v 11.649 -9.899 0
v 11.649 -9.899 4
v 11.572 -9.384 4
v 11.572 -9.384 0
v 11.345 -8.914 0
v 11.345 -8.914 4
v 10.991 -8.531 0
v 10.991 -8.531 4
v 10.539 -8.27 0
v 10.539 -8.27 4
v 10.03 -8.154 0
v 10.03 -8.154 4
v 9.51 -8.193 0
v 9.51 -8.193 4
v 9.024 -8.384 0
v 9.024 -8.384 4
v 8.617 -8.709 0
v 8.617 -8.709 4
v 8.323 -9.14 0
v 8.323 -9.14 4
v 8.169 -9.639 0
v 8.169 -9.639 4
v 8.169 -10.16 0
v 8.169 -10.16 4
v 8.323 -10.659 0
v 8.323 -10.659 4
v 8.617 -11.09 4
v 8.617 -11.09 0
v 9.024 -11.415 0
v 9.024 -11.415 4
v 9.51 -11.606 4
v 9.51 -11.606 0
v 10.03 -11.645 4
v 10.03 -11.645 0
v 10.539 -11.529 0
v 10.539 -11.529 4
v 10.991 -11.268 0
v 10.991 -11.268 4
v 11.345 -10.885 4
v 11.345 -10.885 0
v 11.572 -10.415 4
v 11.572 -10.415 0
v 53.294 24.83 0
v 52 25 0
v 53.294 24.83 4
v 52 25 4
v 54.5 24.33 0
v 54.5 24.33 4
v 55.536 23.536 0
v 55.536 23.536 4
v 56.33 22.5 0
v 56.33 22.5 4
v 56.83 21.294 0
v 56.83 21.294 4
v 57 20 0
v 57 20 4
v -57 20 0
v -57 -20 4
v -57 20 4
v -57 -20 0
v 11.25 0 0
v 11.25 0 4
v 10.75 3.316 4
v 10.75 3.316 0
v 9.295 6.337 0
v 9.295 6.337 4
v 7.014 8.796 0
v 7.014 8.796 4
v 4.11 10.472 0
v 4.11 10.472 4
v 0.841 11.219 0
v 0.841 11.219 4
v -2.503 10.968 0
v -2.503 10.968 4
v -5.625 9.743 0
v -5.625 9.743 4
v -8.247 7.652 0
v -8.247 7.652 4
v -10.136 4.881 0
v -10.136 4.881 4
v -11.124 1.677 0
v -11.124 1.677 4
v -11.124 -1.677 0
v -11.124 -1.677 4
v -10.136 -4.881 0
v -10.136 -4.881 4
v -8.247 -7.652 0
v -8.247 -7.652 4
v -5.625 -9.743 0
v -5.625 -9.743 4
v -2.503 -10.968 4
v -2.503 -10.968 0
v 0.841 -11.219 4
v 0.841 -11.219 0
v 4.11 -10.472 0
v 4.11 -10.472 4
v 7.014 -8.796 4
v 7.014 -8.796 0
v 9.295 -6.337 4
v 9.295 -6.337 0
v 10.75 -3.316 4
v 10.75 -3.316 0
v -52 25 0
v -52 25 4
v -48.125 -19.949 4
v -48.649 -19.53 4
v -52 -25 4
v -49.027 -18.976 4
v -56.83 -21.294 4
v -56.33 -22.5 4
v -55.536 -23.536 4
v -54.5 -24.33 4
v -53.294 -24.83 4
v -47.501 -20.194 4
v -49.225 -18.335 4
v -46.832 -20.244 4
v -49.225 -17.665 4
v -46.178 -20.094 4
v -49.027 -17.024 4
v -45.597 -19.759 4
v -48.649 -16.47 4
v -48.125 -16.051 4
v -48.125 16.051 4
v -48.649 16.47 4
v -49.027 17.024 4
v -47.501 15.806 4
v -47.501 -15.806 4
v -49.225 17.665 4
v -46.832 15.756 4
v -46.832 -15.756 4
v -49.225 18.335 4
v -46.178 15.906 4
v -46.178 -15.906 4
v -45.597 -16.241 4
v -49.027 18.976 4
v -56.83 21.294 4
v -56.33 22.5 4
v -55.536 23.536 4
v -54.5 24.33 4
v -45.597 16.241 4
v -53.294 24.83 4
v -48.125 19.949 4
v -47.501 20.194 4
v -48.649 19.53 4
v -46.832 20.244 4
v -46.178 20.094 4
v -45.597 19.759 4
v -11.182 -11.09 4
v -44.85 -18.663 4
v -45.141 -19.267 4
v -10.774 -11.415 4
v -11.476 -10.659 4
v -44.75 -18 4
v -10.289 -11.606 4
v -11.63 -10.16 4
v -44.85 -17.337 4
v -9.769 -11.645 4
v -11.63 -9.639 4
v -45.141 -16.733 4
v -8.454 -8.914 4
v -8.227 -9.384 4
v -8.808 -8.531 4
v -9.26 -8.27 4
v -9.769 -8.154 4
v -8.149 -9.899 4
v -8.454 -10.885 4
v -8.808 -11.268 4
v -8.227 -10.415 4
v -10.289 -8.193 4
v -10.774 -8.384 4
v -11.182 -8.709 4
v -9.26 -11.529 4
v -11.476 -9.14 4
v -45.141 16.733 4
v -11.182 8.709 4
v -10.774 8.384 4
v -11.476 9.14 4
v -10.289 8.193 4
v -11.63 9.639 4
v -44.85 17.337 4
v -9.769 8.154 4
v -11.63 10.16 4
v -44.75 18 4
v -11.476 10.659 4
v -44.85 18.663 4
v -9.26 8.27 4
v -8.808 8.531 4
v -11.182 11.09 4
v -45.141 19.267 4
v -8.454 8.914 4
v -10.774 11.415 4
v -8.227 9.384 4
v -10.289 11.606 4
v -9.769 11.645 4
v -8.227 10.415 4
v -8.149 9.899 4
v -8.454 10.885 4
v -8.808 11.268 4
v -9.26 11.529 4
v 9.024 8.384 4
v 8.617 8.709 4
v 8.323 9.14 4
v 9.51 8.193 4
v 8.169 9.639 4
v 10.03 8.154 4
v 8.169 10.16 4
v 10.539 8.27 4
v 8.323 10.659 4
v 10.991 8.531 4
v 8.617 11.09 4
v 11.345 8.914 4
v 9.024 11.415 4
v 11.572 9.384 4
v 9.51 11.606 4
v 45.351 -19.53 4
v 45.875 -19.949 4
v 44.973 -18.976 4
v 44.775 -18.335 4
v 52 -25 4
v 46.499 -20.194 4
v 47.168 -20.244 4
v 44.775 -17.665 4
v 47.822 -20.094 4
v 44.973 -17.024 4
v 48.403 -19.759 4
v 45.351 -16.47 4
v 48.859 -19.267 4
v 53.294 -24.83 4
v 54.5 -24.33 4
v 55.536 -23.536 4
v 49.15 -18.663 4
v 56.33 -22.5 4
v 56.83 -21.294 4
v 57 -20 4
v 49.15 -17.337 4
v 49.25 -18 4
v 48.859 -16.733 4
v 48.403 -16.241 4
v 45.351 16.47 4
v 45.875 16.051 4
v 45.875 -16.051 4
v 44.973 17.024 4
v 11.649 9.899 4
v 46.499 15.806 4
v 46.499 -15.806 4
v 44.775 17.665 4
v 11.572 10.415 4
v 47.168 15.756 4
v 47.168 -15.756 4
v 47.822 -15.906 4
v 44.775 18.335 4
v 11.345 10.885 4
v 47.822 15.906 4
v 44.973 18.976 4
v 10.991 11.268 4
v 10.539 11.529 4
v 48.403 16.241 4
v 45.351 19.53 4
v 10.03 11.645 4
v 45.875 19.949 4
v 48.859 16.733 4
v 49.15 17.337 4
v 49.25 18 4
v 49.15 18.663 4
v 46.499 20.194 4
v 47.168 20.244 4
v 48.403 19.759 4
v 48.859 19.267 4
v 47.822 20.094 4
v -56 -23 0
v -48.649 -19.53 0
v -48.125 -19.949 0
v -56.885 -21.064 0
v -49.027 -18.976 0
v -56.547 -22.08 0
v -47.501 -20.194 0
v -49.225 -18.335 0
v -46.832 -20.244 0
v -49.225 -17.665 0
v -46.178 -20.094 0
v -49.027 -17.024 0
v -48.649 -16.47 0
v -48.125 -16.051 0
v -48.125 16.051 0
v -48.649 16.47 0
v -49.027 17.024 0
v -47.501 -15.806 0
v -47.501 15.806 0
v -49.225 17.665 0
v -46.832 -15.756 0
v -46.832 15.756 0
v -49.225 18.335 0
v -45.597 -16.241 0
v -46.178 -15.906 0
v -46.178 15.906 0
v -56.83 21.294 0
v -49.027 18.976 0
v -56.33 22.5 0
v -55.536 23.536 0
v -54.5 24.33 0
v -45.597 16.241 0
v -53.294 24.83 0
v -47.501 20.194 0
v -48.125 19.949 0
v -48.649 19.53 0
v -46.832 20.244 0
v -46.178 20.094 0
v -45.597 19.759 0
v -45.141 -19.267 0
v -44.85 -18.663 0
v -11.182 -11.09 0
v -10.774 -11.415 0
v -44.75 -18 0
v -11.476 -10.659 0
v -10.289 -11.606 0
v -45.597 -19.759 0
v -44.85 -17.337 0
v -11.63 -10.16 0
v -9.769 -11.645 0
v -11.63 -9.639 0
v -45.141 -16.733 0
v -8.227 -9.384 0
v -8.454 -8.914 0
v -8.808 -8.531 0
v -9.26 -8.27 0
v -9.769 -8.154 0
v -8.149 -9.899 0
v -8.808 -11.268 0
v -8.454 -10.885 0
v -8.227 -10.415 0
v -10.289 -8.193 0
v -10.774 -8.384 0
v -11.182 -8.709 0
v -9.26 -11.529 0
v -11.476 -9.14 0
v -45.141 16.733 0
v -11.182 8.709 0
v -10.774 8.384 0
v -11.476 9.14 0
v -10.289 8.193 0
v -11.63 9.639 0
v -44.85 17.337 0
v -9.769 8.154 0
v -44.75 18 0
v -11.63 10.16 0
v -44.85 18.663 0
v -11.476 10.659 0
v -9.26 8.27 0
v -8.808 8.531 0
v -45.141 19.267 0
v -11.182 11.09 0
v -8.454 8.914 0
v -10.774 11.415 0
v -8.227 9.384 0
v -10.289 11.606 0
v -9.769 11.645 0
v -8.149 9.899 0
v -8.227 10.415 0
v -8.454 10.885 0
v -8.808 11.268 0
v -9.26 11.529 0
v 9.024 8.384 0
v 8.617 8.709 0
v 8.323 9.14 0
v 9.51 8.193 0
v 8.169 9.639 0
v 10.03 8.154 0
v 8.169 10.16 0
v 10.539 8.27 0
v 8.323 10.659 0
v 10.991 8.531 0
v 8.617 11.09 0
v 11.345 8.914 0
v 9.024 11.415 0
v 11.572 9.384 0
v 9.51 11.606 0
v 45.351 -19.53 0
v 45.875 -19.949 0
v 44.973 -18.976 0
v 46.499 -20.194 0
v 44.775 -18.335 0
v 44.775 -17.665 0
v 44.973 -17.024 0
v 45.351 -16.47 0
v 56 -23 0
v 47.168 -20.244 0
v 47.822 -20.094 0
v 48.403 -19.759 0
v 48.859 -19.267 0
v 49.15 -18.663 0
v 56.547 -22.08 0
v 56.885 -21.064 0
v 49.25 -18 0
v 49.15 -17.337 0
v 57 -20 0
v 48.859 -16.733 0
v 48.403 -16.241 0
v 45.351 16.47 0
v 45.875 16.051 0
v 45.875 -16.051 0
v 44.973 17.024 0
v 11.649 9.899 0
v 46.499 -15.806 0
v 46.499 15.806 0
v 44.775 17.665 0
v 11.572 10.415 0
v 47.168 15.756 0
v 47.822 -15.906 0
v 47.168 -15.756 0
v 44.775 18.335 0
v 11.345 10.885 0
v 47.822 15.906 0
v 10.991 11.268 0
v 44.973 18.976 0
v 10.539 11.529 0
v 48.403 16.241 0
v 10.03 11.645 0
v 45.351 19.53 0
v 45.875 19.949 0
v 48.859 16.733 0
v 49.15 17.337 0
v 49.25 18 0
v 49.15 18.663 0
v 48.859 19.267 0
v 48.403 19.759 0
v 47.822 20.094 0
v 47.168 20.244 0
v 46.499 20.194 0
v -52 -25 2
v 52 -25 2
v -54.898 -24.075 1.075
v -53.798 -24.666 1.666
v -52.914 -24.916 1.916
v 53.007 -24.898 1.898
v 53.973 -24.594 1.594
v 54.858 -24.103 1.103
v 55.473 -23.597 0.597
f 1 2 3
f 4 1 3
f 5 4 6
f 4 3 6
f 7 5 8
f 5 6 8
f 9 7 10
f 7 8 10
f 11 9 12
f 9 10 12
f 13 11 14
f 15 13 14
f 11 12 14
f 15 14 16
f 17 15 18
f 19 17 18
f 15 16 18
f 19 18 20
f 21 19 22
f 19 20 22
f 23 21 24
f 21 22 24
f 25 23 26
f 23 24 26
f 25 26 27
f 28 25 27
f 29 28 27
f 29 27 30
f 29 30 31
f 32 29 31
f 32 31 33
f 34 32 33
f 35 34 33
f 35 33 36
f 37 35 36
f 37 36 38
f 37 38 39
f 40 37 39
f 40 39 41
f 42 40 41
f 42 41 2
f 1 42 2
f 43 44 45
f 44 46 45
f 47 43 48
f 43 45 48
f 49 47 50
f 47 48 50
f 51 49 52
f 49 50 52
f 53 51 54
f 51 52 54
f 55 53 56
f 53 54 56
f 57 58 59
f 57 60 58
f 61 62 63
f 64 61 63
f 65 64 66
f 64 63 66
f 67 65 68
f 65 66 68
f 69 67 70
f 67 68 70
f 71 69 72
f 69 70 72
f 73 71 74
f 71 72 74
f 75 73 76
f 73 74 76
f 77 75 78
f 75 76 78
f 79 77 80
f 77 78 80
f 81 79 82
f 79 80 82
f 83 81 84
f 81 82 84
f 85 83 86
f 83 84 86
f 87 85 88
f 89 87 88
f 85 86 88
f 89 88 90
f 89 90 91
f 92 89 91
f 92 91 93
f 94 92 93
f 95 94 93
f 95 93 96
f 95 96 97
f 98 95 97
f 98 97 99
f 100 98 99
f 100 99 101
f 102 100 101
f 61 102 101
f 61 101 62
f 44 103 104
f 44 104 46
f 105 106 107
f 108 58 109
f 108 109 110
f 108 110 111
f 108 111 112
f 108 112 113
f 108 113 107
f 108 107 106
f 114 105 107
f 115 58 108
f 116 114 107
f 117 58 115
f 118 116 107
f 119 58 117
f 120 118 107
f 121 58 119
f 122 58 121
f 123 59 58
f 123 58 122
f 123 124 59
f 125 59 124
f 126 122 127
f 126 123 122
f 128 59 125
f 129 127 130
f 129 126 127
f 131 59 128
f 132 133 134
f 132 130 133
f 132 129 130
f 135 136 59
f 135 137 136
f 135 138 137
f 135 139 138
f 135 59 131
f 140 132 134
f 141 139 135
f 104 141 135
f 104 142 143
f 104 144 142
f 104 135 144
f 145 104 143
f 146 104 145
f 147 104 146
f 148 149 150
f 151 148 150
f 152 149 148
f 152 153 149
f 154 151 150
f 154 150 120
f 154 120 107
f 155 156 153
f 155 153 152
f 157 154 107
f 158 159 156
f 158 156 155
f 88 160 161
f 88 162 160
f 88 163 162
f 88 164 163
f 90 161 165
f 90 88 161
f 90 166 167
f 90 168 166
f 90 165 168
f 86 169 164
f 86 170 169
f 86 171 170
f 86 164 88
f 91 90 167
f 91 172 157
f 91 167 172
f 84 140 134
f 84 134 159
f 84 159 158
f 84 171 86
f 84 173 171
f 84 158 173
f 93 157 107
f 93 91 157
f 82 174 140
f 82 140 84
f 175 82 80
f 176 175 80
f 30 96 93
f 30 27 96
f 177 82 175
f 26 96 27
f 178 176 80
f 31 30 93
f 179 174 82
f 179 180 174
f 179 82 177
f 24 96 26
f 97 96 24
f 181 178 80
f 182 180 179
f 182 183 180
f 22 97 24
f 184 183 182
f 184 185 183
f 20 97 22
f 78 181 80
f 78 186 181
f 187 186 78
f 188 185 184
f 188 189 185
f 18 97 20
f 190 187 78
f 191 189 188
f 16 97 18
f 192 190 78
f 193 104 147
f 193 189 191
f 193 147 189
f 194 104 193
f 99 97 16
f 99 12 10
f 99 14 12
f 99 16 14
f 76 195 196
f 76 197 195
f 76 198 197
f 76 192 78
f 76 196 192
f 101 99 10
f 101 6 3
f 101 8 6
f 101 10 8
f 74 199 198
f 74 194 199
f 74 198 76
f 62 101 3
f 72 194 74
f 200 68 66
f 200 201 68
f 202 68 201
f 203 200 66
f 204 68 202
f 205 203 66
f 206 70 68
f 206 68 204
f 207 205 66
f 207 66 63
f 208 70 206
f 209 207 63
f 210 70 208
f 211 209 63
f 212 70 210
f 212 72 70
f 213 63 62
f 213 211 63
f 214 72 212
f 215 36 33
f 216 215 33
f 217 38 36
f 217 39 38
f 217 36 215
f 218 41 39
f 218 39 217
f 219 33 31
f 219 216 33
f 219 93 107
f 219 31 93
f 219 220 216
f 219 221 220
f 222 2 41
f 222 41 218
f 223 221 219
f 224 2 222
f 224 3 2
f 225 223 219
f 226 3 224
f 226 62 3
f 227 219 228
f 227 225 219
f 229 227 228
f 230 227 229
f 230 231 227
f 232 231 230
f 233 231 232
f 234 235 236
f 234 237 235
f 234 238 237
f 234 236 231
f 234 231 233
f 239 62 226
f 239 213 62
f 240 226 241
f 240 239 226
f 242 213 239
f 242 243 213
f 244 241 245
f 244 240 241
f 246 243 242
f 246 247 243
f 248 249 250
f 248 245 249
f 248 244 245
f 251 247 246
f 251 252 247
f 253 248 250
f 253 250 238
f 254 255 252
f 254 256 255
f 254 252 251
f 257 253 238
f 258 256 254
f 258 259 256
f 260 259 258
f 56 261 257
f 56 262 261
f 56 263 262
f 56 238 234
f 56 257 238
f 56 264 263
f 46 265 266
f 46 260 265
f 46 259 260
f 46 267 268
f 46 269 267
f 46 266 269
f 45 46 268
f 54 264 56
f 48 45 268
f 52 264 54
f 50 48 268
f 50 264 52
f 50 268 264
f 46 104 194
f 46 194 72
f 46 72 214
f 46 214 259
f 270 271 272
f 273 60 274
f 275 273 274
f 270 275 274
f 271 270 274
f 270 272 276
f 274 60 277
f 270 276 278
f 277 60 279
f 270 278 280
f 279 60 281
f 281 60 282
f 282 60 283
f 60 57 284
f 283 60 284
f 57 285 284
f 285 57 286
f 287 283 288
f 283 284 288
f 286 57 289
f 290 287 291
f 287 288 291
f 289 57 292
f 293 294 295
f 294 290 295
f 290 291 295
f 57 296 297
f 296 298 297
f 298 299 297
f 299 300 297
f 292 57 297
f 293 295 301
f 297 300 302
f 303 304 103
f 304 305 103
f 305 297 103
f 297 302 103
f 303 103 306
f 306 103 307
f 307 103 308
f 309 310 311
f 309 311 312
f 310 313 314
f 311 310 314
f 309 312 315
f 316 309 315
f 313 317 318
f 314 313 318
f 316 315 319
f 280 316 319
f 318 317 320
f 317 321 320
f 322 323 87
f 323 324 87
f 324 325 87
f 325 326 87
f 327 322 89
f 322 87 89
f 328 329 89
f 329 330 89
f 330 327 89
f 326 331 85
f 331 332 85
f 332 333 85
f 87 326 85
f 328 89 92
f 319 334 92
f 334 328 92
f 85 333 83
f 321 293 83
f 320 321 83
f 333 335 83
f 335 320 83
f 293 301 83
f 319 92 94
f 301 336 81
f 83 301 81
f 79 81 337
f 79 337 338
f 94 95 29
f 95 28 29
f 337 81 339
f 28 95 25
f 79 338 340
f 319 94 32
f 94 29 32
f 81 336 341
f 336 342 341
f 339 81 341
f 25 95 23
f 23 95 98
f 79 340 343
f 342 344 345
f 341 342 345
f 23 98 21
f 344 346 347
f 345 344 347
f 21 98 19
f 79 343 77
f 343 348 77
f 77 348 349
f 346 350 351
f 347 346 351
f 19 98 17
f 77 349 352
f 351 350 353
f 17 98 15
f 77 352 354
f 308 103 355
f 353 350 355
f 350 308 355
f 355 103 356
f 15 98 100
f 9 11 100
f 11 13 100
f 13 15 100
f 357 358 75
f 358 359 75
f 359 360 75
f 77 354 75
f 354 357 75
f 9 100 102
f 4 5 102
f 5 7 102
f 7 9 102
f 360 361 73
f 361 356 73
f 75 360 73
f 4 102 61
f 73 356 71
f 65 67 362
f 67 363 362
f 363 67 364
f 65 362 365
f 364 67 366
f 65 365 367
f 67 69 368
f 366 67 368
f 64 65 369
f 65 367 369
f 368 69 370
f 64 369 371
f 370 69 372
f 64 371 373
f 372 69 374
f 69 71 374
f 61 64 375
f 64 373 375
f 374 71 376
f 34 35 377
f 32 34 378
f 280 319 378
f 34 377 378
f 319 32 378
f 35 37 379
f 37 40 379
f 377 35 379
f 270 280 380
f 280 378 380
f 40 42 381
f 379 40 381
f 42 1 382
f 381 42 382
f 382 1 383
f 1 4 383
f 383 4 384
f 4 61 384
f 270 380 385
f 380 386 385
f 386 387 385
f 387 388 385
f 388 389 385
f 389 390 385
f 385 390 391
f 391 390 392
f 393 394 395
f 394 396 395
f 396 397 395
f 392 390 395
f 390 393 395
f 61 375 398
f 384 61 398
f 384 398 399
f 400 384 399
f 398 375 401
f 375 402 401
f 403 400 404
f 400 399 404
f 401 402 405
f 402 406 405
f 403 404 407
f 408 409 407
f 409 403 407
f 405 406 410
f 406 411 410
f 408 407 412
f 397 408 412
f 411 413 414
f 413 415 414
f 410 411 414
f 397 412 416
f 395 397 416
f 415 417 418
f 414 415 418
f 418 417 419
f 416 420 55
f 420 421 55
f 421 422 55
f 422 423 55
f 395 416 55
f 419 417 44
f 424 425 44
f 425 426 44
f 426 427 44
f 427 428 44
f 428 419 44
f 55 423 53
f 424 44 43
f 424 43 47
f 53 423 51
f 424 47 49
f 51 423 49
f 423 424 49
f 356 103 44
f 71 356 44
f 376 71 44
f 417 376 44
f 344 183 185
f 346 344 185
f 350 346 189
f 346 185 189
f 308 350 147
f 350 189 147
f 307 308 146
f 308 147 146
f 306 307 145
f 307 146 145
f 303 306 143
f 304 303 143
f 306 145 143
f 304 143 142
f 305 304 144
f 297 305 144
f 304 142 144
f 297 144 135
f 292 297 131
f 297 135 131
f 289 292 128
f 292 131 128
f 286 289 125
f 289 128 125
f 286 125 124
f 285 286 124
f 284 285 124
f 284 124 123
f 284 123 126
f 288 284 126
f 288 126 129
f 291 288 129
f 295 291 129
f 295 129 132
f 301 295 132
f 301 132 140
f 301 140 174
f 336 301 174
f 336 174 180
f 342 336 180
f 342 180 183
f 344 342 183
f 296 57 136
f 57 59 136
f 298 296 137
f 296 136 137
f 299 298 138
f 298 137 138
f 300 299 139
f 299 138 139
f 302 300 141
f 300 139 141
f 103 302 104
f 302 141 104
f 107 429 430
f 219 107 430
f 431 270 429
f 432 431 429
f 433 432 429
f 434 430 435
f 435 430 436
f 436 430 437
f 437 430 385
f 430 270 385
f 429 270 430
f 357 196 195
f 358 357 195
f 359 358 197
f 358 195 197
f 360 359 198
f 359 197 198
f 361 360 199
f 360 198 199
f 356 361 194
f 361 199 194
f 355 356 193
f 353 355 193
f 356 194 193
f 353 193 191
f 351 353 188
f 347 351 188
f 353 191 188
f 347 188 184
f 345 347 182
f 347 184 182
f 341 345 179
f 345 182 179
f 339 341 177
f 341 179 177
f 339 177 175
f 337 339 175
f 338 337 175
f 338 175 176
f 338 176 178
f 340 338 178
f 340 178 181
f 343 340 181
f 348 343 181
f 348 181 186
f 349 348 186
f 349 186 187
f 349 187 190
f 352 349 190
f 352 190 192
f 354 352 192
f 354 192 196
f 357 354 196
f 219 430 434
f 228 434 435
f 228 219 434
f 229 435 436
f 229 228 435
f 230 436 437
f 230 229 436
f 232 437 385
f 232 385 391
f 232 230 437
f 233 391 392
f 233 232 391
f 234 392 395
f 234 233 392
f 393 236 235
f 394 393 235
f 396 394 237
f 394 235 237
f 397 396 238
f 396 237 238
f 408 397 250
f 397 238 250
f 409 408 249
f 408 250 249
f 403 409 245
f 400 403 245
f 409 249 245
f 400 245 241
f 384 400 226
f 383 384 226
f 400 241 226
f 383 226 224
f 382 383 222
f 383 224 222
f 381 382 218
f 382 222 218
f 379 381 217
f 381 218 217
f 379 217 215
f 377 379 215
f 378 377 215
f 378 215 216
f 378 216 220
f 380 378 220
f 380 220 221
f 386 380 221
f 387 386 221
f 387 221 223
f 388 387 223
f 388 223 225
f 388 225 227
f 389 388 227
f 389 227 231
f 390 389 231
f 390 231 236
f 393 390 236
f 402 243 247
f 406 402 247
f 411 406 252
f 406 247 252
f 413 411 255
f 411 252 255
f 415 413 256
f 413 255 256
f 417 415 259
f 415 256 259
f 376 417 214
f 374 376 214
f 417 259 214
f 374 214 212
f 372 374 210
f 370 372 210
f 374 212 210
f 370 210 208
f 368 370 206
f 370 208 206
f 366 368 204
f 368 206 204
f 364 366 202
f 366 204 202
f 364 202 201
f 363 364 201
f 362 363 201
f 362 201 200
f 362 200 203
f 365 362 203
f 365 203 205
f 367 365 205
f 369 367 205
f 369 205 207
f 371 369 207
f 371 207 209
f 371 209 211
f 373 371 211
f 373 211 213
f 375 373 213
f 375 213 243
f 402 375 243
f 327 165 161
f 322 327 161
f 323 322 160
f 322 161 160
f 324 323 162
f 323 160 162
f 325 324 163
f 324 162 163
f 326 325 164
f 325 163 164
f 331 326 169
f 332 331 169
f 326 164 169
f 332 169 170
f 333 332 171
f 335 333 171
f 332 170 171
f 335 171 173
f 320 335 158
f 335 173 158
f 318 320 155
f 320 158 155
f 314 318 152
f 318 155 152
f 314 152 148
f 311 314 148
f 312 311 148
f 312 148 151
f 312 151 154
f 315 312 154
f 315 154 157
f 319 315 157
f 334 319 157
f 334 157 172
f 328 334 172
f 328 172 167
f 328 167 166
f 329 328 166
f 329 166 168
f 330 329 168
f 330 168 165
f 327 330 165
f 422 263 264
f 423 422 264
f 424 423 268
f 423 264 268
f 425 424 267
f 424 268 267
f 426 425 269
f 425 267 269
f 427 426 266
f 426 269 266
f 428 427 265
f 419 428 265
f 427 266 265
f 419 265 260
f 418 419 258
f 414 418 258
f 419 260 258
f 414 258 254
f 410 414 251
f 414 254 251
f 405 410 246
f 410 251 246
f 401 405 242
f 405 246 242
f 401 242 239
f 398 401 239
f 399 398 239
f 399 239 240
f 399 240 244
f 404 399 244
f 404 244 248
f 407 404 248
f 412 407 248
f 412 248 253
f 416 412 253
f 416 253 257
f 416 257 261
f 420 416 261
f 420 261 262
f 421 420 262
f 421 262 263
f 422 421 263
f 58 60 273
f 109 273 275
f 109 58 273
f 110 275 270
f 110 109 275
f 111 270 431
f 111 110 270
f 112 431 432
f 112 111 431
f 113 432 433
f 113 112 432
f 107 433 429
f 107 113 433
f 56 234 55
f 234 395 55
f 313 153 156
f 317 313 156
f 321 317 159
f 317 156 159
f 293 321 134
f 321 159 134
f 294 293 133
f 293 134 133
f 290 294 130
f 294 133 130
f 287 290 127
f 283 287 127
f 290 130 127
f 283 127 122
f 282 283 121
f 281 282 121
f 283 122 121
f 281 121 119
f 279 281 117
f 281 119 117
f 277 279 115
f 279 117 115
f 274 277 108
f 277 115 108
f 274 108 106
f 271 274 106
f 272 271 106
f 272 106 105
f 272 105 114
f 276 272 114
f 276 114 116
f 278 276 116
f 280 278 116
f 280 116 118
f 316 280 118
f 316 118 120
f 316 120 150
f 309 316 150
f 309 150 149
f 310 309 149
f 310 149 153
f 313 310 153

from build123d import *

# Parameters (mm, degrees)
SKETCH_W      = 114
SKETCH_H      = 50
PAD_DEPTH     = 4
SKETCH001_R   = 11.25
SKETCH001_R_2 = 2.25
SKETCH001_R_3 = 1.75
POCKET_DEPTH  = 4.001
CHAMFER_SIZE  = 2
FILLET_R      = 5


with BuildPart() as part:
    # Sketch → Pad (new body)
    with BuildSketch(Plane.XY):
        Rectangle(SKETCH_W, SKETCH_H)
    extrude(amount=PAD_DEPTH)

    # Sketch001 → Pocket (cut, through all)
    with BuildSketch(Plane.XY.offset(4)):
        Circle(SKETCH001_R)
        with Locations((-47, 18)):
            Circle(SKETCH001_R_2)
        with Locations((-47, -18)):
            Circle(SKETCH001_R_2)
        with Locations((47, 18)):
            Circle(SKETCH001_R_2)
        with Locations((47, -18)):
            Circle(SKETCH001_R_2)
        with Locations((-9.899495, 9.899495)):
            Circle(SKETCH001_R_3)
        with Locations((9.899495, 9.899495)):
            Circle(SKETCH001_R_3)
        with Locations((9.899495, -9.899495)):
            Circle(SKETCH001_R_3)
        with Locations((-9.899495, -9.899495)):
            Circle(SKETCH001_R_3)
    extrude(amount=-POCKET_DEPTH, mode=Mode.SUBTRACT)

    # Chamfer
    chamfer_edges = [part.edges().sort_by_distance(p)[0] for p in [
        (0, -25, 0),
    ]]
    chamfer(chamfer_edges, length=CHAMFER_SIZE)

    # Fillet
    fillet_edges = [part.edges().sort_by_distance(p)[0] for p in [
        (-57, -25, 3),
        (-57, 25, 2),
        (57, -25, 3),
        (57, 25, 2),
    ]]
    fillet(fillet_edges, radius=FILLET_R)


solid = part.part
